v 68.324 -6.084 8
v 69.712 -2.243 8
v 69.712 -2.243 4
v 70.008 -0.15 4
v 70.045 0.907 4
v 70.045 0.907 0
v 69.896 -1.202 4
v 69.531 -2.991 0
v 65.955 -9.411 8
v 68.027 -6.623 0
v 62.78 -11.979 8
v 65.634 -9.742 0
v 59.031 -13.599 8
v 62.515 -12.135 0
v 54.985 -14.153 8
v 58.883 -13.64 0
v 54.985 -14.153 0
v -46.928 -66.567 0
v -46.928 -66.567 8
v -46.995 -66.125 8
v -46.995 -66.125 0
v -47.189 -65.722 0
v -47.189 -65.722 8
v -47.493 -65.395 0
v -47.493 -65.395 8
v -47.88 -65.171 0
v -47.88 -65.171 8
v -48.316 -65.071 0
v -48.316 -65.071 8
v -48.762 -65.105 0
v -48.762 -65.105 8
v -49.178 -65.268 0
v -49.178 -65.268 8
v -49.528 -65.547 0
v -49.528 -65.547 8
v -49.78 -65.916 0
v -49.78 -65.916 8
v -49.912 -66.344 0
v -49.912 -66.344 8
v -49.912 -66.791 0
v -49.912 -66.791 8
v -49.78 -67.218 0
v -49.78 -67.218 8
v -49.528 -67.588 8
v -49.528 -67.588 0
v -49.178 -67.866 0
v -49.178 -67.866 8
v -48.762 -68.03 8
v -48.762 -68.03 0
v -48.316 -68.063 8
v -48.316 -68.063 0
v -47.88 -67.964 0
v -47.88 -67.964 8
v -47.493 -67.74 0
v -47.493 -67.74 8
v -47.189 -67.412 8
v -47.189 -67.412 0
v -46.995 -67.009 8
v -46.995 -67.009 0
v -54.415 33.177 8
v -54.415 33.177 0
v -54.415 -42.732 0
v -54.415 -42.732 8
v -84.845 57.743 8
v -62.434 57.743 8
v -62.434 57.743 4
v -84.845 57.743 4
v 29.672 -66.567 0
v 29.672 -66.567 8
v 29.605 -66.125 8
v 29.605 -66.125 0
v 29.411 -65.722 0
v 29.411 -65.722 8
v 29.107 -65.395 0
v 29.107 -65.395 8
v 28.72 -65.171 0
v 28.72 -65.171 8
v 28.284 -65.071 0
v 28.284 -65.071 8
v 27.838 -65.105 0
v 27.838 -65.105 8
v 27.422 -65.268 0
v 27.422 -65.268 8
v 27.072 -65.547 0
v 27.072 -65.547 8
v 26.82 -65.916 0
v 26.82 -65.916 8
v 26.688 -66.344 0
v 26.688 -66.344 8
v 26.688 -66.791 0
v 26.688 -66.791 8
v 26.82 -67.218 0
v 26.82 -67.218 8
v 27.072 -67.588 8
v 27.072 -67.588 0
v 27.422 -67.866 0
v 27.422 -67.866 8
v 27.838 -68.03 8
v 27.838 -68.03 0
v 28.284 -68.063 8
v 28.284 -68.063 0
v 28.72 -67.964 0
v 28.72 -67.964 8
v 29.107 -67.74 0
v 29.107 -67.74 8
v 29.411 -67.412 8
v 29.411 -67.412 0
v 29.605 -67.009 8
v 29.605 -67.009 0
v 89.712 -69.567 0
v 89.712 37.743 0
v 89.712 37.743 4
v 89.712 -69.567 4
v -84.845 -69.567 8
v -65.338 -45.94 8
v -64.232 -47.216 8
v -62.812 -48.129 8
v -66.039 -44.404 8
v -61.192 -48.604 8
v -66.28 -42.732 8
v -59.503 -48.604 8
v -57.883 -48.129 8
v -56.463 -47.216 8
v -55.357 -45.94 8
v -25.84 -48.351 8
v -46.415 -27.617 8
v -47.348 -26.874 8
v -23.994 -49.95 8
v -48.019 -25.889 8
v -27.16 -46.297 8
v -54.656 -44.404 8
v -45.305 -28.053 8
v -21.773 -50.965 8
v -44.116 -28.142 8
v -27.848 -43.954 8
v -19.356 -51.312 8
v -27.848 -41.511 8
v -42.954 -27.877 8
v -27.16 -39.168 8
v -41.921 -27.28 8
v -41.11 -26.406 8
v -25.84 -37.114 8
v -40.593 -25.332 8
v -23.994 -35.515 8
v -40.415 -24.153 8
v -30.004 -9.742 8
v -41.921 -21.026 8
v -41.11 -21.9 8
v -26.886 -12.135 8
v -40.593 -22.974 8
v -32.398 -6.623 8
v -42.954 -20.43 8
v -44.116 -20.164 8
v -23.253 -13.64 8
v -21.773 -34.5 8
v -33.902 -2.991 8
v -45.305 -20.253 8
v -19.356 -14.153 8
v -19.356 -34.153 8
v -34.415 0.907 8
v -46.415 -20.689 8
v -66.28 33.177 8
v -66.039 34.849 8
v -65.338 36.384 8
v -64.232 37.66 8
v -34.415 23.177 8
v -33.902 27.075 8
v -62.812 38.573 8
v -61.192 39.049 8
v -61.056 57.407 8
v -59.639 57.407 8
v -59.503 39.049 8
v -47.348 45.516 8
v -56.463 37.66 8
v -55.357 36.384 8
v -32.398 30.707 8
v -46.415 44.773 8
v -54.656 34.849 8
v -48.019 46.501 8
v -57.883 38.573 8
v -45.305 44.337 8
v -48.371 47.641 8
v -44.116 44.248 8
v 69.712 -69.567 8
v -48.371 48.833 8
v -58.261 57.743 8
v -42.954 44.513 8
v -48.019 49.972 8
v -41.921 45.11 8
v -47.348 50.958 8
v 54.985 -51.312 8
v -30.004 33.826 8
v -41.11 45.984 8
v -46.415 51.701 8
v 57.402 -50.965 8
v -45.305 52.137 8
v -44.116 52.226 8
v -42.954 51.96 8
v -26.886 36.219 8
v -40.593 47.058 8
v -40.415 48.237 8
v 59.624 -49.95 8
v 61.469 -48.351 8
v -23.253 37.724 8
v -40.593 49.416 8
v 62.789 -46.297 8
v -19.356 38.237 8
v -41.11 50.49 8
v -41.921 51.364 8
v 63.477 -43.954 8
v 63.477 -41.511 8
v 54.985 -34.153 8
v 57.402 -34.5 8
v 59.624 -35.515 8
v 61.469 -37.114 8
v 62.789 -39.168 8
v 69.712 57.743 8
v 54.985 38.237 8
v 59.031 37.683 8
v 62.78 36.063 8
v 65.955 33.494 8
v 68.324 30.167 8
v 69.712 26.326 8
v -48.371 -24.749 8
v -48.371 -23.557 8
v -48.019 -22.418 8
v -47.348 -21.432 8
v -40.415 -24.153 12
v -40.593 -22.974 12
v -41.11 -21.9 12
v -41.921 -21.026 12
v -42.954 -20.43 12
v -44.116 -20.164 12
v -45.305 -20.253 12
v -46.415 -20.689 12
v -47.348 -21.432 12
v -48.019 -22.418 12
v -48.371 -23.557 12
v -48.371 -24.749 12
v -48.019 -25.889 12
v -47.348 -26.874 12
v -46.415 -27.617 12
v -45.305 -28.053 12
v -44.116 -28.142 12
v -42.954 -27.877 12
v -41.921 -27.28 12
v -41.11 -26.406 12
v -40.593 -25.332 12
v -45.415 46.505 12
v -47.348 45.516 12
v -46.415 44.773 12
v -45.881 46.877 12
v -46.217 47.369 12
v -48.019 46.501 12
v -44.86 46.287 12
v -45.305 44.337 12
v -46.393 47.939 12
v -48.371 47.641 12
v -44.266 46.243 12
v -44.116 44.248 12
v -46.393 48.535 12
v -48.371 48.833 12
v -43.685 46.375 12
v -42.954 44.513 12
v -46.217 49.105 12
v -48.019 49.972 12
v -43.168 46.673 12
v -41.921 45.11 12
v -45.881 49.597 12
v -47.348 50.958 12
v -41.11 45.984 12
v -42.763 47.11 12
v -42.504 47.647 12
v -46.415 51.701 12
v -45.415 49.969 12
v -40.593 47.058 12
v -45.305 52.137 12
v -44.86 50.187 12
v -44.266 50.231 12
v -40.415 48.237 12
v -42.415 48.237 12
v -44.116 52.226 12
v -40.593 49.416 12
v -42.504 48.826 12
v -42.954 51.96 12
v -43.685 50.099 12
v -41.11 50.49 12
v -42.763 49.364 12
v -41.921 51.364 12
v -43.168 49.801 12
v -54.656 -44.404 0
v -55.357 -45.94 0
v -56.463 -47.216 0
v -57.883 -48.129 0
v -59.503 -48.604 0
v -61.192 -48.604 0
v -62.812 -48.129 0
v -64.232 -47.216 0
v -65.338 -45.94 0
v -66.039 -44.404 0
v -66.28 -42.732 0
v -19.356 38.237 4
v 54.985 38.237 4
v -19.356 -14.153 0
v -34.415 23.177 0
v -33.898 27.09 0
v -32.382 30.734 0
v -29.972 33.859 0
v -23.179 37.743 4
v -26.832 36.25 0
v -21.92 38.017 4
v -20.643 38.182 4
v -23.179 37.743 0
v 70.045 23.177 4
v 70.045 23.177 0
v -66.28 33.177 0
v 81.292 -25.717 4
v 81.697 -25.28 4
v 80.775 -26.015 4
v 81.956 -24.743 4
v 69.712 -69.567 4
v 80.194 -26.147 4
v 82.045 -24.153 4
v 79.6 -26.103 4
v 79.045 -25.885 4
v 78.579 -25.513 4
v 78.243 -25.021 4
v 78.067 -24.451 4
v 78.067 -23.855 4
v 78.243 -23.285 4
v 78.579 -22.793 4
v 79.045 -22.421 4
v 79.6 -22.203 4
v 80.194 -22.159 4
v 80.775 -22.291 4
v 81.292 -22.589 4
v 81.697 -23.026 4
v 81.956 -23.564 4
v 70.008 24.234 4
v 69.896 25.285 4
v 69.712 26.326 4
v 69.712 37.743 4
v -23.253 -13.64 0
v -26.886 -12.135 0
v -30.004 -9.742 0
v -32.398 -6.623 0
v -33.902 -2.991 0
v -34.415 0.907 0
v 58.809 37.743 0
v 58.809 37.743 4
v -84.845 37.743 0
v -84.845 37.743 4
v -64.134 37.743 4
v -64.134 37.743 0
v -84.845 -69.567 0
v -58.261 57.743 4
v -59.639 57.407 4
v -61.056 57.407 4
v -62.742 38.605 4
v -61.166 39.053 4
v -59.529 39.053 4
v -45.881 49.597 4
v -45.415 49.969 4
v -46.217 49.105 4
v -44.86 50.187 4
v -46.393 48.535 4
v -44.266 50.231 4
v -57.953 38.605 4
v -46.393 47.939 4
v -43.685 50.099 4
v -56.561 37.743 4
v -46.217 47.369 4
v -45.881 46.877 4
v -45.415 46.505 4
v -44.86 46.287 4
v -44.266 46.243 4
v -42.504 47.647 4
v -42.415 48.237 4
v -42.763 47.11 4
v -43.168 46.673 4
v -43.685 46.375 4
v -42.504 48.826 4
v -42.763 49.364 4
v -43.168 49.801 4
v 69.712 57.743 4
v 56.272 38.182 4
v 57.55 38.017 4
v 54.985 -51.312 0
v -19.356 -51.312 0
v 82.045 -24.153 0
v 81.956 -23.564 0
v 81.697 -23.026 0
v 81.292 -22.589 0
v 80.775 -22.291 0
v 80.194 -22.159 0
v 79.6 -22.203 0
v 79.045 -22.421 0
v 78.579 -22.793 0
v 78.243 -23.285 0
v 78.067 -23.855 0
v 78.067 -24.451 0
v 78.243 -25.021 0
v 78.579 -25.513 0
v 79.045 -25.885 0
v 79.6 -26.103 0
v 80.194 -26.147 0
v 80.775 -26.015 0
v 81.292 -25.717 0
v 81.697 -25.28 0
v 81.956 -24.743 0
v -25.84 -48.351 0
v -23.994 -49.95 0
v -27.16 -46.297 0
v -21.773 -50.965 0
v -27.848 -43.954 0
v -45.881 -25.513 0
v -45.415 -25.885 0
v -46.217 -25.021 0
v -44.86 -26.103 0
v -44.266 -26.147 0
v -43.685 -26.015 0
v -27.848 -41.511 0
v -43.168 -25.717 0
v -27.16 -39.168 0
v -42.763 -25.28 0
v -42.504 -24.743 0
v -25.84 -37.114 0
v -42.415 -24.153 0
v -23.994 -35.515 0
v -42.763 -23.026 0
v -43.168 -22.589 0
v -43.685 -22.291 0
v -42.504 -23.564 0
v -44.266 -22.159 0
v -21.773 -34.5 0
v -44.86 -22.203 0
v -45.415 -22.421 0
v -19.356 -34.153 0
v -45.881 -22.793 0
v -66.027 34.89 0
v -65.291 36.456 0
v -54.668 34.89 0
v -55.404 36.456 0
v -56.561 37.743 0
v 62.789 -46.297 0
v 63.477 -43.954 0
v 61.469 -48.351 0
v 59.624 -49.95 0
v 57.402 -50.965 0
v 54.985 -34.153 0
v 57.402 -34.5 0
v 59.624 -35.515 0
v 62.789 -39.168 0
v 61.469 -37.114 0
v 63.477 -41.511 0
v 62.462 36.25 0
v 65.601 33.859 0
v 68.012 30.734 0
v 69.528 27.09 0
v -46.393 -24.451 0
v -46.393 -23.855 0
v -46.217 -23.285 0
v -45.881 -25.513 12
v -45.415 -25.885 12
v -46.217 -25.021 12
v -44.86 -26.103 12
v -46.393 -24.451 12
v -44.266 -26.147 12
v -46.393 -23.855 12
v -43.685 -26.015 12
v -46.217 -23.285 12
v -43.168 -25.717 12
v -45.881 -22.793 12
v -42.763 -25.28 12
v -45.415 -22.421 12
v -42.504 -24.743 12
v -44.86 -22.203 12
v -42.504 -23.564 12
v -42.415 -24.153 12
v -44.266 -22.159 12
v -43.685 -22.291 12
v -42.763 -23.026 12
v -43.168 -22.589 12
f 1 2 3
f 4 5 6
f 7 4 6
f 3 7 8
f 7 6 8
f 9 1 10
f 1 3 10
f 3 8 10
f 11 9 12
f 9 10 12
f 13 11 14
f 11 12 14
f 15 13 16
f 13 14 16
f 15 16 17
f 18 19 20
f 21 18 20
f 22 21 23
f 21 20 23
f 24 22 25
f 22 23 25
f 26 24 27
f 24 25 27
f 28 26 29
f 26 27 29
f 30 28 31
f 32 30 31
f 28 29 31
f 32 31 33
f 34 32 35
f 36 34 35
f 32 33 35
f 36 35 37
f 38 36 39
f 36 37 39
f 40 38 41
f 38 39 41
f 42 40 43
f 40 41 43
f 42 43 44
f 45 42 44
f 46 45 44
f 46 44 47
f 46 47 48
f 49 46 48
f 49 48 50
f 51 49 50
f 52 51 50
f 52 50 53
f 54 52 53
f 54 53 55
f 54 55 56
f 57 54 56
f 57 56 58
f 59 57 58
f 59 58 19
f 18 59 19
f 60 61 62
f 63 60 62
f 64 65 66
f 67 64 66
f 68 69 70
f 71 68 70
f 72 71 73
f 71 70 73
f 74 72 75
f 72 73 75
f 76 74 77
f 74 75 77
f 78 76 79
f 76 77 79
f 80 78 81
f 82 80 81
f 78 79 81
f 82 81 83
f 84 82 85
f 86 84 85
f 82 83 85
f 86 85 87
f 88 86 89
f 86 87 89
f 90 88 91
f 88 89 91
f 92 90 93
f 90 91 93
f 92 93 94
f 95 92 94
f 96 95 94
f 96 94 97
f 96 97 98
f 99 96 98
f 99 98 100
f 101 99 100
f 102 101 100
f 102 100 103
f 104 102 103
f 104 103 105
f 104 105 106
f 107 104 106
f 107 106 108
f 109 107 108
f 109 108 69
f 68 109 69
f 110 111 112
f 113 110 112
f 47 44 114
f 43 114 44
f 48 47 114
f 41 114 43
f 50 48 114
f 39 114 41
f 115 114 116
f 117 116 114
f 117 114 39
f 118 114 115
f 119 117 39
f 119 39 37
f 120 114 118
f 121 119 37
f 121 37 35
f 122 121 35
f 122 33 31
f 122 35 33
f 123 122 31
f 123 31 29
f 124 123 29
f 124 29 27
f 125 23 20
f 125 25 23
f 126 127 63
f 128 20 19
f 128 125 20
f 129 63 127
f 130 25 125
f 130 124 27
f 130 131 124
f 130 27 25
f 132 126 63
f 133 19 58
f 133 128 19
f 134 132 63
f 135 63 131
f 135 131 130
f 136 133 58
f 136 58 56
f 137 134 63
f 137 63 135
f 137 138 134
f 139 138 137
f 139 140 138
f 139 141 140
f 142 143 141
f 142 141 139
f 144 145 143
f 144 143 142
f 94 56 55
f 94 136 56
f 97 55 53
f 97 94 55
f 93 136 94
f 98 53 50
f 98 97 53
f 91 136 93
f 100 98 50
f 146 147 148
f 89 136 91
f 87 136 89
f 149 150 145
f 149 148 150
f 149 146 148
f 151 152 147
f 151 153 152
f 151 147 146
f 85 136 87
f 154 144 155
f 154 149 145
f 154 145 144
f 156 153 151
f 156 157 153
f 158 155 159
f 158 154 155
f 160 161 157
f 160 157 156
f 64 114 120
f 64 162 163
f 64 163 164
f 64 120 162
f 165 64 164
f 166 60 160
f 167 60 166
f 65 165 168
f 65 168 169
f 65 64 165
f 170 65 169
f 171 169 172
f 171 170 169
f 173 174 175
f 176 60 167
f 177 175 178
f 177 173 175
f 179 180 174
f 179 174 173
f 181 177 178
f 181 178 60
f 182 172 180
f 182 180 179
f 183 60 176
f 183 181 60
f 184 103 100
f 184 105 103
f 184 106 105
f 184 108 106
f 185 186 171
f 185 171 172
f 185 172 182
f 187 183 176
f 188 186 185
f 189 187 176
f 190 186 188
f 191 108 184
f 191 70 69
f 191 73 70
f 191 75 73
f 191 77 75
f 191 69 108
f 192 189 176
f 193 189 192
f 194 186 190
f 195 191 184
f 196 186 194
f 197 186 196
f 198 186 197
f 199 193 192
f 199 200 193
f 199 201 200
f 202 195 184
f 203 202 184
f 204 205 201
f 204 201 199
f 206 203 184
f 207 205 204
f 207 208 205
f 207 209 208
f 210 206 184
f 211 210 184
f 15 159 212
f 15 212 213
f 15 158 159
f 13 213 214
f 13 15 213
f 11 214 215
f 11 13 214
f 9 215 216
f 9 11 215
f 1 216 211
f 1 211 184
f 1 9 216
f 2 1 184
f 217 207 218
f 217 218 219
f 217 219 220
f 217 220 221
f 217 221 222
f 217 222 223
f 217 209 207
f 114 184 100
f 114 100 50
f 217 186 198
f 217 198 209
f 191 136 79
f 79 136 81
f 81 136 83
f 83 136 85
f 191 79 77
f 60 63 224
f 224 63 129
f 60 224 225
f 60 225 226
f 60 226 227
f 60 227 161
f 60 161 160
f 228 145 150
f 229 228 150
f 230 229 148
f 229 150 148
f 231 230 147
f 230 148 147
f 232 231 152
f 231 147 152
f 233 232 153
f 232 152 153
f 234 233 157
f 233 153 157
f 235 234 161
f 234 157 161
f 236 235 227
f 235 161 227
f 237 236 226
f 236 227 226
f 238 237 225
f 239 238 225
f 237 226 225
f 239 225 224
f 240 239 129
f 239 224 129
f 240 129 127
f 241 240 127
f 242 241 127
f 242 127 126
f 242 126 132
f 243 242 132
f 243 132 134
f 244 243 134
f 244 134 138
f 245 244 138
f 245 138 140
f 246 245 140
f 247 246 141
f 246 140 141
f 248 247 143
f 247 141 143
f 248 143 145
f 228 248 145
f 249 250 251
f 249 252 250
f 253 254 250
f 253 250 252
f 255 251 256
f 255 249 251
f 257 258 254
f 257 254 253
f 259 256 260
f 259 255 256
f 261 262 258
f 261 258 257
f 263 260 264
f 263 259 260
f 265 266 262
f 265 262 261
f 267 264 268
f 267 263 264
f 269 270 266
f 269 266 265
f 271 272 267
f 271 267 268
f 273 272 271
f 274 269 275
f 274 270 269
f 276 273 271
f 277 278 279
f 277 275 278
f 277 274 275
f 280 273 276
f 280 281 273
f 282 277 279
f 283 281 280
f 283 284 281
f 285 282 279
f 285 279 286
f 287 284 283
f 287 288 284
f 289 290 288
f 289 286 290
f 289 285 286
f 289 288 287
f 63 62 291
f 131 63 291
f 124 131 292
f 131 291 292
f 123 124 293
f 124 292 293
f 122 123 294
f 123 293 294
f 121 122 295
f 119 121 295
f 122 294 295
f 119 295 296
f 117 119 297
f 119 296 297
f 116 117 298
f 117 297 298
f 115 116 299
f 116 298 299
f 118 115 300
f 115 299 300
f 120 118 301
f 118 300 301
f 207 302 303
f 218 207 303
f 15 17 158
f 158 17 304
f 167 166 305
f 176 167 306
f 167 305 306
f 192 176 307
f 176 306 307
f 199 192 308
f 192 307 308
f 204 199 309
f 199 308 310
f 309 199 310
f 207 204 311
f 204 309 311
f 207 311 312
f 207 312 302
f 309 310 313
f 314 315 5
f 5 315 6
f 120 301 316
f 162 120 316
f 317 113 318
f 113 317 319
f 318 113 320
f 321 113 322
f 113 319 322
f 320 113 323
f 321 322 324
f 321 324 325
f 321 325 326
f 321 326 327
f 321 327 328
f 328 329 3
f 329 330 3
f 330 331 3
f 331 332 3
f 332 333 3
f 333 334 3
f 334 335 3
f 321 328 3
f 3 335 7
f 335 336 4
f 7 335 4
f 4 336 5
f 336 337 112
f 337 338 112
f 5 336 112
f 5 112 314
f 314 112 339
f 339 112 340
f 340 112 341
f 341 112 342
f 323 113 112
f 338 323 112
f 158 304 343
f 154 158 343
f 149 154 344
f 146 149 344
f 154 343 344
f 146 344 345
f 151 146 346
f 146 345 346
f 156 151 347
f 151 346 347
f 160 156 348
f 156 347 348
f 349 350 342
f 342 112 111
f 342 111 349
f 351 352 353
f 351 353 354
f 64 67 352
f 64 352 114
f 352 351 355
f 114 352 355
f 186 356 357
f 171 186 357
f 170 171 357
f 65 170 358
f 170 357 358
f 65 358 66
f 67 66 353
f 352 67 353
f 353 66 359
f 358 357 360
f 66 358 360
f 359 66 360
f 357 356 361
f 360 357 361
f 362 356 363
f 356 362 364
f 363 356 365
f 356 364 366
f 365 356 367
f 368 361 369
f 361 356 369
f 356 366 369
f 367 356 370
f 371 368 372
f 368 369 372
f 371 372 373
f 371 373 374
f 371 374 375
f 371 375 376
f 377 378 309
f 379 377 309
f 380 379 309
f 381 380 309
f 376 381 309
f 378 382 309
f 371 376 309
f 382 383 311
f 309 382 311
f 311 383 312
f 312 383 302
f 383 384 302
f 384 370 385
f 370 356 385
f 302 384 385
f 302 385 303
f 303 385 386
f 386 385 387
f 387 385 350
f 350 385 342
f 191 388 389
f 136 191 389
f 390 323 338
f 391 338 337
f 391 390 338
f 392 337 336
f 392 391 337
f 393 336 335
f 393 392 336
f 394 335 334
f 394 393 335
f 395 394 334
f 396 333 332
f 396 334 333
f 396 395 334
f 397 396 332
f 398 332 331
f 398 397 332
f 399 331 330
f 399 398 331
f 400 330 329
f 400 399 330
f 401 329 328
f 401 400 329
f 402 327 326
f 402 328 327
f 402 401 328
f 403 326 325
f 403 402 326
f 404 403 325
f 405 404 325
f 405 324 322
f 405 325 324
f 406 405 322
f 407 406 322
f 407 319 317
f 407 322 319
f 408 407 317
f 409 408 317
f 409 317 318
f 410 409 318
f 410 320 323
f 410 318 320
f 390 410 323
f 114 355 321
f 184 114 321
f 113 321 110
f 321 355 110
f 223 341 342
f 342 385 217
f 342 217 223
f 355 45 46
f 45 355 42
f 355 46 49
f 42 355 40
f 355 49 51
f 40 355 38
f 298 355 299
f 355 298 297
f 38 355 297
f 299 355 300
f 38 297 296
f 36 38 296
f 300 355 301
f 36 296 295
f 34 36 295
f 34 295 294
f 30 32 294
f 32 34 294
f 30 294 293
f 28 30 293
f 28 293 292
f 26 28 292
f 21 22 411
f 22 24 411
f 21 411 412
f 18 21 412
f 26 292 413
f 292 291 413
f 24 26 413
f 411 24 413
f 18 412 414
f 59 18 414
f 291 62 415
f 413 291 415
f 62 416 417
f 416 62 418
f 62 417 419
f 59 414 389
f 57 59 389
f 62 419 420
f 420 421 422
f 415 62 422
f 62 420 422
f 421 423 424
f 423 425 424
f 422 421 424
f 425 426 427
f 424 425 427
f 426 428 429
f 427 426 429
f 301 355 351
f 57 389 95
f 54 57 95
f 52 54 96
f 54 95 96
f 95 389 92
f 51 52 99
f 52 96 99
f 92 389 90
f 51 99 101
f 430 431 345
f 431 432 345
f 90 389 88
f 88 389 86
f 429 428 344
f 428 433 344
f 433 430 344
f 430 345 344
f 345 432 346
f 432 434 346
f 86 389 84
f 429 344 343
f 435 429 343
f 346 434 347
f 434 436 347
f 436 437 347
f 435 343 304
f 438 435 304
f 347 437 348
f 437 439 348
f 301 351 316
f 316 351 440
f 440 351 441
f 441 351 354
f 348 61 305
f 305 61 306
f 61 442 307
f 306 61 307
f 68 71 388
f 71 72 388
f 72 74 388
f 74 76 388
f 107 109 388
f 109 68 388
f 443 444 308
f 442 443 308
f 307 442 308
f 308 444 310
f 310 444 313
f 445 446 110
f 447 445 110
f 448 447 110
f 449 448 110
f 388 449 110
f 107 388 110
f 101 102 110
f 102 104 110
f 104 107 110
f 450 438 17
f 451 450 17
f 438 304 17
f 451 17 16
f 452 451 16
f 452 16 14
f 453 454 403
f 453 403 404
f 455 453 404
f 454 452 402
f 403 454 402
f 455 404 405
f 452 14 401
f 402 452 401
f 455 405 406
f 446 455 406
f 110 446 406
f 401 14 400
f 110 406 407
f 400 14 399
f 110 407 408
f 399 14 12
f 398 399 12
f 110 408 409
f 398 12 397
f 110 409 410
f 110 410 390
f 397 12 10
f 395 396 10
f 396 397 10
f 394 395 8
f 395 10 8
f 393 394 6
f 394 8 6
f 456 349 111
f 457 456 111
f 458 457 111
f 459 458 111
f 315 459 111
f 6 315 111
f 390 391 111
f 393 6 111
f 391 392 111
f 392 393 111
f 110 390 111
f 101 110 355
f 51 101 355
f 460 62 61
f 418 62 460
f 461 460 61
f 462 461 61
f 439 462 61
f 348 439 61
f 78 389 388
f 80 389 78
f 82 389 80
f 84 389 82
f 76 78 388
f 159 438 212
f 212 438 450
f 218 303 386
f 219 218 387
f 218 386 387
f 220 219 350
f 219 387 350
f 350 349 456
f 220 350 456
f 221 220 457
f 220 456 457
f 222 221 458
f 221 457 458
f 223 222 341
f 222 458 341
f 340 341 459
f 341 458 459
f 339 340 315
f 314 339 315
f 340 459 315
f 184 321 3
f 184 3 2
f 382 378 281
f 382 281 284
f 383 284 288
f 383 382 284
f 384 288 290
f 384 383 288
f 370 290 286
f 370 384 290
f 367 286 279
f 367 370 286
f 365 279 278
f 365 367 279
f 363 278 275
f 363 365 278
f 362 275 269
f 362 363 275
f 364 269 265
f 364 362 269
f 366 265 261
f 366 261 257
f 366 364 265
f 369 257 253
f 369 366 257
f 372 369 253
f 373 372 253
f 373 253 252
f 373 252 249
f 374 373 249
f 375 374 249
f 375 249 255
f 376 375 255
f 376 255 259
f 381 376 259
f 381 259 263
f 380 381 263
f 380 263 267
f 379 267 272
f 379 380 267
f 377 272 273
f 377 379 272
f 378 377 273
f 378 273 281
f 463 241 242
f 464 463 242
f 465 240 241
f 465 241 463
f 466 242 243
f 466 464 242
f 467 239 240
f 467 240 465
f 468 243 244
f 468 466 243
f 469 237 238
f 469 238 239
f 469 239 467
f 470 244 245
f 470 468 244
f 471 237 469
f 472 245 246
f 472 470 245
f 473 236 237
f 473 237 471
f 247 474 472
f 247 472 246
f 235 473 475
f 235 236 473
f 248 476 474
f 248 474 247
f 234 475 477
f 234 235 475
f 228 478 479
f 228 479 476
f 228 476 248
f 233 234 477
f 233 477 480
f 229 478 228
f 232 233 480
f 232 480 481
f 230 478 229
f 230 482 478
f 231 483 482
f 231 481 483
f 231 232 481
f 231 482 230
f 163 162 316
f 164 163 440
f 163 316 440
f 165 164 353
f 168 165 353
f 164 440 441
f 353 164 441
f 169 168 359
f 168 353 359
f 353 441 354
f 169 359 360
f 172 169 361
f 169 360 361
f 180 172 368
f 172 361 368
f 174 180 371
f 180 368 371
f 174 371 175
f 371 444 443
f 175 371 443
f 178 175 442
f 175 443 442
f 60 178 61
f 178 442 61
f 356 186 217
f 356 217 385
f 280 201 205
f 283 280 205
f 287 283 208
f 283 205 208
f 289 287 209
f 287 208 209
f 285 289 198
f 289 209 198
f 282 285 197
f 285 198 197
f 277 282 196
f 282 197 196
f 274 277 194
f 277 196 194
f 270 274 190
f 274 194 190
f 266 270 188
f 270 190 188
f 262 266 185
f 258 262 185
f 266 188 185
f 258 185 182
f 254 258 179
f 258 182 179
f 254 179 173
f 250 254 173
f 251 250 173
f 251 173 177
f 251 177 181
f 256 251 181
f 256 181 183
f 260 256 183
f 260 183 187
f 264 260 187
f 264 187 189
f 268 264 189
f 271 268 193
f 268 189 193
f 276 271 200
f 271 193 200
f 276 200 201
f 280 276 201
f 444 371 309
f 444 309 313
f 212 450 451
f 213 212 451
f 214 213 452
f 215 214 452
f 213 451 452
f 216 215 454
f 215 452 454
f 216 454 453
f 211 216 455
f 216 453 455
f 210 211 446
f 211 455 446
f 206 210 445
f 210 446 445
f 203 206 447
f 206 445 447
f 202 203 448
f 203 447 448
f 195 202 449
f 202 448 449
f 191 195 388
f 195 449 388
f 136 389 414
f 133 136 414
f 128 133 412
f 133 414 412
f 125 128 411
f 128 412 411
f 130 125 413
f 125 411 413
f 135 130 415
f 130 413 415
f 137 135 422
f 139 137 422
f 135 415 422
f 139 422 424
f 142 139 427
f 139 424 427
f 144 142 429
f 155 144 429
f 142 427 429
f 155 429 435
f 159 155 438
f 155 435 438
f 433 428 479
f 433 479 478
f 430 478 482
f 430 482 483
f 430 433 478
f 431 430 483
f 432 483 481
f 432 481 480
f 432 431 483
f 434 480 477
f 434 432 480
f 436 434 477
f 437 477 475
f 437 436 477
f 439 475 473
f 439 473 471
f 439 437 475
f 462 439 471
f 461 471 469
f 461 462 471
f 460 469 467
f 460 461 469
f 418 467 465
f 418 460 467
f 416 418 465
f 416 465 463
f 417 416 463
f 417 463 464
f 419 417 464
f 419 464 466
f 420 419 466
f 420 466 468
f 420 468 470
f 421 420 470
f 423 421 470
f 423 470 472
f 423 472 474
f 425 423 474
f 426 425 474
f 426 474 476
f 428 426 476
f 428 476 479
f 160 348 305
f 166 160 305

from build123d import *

# Parameters (mm, degrees)
F0_R      = 2
F1_DEPTH  = 8
F3_DEPTH  = 185
F5_DEPTH  = 5
F6_R      = 4
F6_R_2    = 2
F7_DEPTH  = 4
F9_DEPTH  = 340
F11_DEPTH = 320
F12_DEPTH = 190
F13_R     = 1.5
F14_DEPTH = 25


with BuildPart() as f1:
    # F0 (on Top) → F1 (new body)
    with BuildSketch(Plane.XY):
        Polygon((248.954638797, 211.431907829), (-84.8453715444, 211.431907829), (-84.8453715444, -69.5673050332), (248.954638797, -69.5673050332), (248.954638797, -32.408092171), align=None)
        with Locations((-44.415361203, -24.153092171)):
            Circle(F0_R, mode=Mode.SUBTRACT)
        with BuildLine():
            Line((-54.4153634839, 33.1772758796), (-54.4153634839, -42.7324894255))
            ThreePointArc((-54.4153634839, -42.7324894255), (-60.3474954333, -48.664621375), (-66.2796273828, -42.7324894255))
            Line((-66.2796273828, -42.7324894255), (-66.2796273828, 33.1772758796))
            ThreePointArc((-66.2796273828, 33.1772758796), (-60.3474954333, 39.109407829), (-54.4153634839, 33.1772758796))
        make_face(mode=Mode.SUBTRACT)
        with BuildLine():
            Line((-19.3557292535, -34.1526738179), (54.9850068476, -34.1526738179))
            ThreePointArc((54.9850068476, -34.1526738179), (63.5648240612, -42.7324878197), (54.9850100594, -51.3123050332))
            Line((54.9850100594, -51.3123050332), (-19.3557260418, -51.3123050332))
            ThreePointArc((-19.3557260418, -51.3123050332), (-27.9355464671, -42.7324910314), (-19.3557292535, -34.1526738179))
        make_face(mode=Mode.SUBTRACT)
        with Locations((80.044638797, -24.153092171)):
            Circle(F0_R, mode=Mode.SUBTRACT)
        with Locations((-44.415361203, 48.236907829)):
            Circle(F0_R, mode=Mode.SUBTRACT)
        with BuildLine():
            ThreePointArc((-34.415361203, 23.1772758796), (-30.0044971271, 33.8260437532), (-19.3557292535, 38.236907829))
            Line((-19.3557292535, 38.236907829), (54.9850068476, 38.236907829))
            ThreePointArc((54.9850068476, 38.236907829), (65.6337747212, 33.8260437532), (70.044638797, 23.1772758796))
            Line((70.044638797, 23.1772758796), (70.044638797, 0.9065397785))
            ThreePointArc((70.044638797, 0.9065397785), (65.6337747212, -9.7422280951), (54.9850068476, -14.153092171))
            Line((54.9850068476, -14.153092171), (-19.3557292535, -14.153092171))
            ThreePointArc((-19.3557292535, -14.153092171), (-30.0044971271, -9.7422280951), (-34.415361203, 0.9065397785))
            Line((-34.415361203, 0.9065397785), (-34.415361203, 23.1772758796))
        make_face(mode=Mode.SUBTRACT)
        with Locations((80.044638797, 48.236907829)):
            Circle(F0_R, mode=Mode.SUBTRACT)
        with BuildLine():
            ThreePointArc((212.4650068476, -34.1526738179), (221.0448240612, -42.7324878197), (212.4650100594, -51.3123050332))
            Line((212.4650100594, -51.3123050332), (105.1042739582, -51.3123050332))
            ThreePointArc((105.1042739582, -51.3123050332), (96.5244567447, -42.7324910314), (105.1042707465, -34.1526738179))
            Line((105.1042707465, -34.1526738179), (212.4650068476, -34.1526738179))
        make_face(mode=Mode.SUBTRACT)
        with Locations((237.524638797, -24.153092171)):
            Circle(F0_R, mode=Mode.SUBTRACT)
        with BuildLine():
            Line((90.044638797, 0.9065397785), (90.044638797, 23.1772758796))
            ThreePointArc((90.044638797, 23.1772758796), (94.4555028729, 33.8260437532), (105.1042707465, 38.236907829))
            Line((105.1042707465, 38.236907829), (212.4650068476, 38.236907829))
            ThreePointArc((212.4650068476, 38.236907829), (223.1137747212, 33.8260437532), (227.524638797, 23.1772758796))
            Line((227.524638797, 23.1772758796), (227.524638797, 0.9065397785))
            ThreePointArc((227.524638797, 0.9065397785), (223.1137747212, -9.7422280951), (212.4650068476, -14.153092171))
            Line((212.4650068476, -14.153092171), (105.1042707465, -14.153092171))
            ThreePointArc((105.1042707465, -14.153092171), (94.4555028729, -9.7422280951), (90.044638797, 0.9065397785))
        make_face(mode=Mode.SUBTRACT)
        with Locations((237.524638797, 48.236907829)):
            Circle(F0_R, mode=Mode.SUBTRACT)
        with BuildLine():
            Line((-54.4153634839, 180.316907829), (-54.4153634839, 63.2965397785))
            ThreePointArc((-54.4153634839, 63.2965397785), (-60.3474954333, 57.364407829), (-66.2796273828, 63.2965397785))
            Line((-66.2796273828, 63.2965397785), (-66.2796273828, 180.316907829))
            ThreePointArc((-66.2796273828, 180.316907829), (-60.3474954333, 186.2490397785), (-54.4153634839, 180.316907829))
        make_face(mode=Mode.SUBTRACT)
        with BuildLine():
            Line((-34.415361203, 73.2965397785), (-34.415361203, 178.1172758796))
            ThreePointArc((-34.415361203, 178.1172758796), (-30.0044971271, 188.7660437532), (-19.3557292535, 193.176907829))
            Line((-19.3557292535, 193.176907829), (54.9850068476, 193.176907829))
            ThreePointArc((54.9850068476, 193.176907829), (65.6337747212, 188.7660437532), (70.044638797, 178.1172758796))
            Line((70.044638797, 178.1172758796), (70.044638797, 73.2965397785))
            ThreePointArc((70.044638797, 73.2965397785), (65.6337747212, 62.6477719049), (54.9850068476, 58.236907829))
            Line((54.9850068476, 58.236907829), (-19.3557292535, 58.236907829))
            ThreePointArc((-19.3557292535, 58.236907829), (-30.0044971271, 62.6477719049), (-34.415361203, 73.2965397785))
        make_face(mode=Mode.SUBTRACT)
        with Locations((-44.415361203, 203.176907829)):
            Circle(F0_R, mode=Mode.SUBTRACT)
        with Locations((80.044638797, 203.176907829)):
            Circle(F0_R, mode=Mode.SUBTRACT)
        with BuildLine():
            ThreePointArc((227.524638797, 73.2965397785), (223.1137747212, 62.6477719049), (212.4650068476, 58.236907829))
            Line((212.4650068476, 58.236907829), (105.1042707465, 58.236907829))
            ThreePointArc((105.1042707465, 58.236907829), (94.4555028729, 62.6477719049), (90.044638797, 73.2965397785))
            Line((90.044638797, 73.2965397785), (90.044638797, 178.1172758796))
            ThreePointArc((90.044638797, 178.1172758796), (94.4555028729, 188.7660437532), (105.1042707465, 193.176907829))
            Line((105.1042707465, 193.176907829), (212.4650068476, 193.176907829))
            Line((212.4650068476, 193.176907829), (212.4650068476, 170.316907829))
            ThreePointArc((212.4650068476, 170.316907829), (223.1137747212, 165.9060437532), (227.524638797, 155.2572758796))
            Line((227.524638797, 155.2572758796), (227.524638797, 73.2965397785))
        make_face(mode=Mode.SUBTRACT)
        with Locations((237.524638797, 180.316907829)):
            Circle(F0_R, mode=Mode.SUBTRACT)
    extrude(amount=F1_DEPTH)

    # F2 (on face) → F3 (join)
    with BuildSketch(Plane.XY.offset(8)):
        Polygon((15.1546284556, 211.431907829), (-84.8453715444, 211.431907829), (-84.8453715444, 71.431907829), (-81.8453715444, 71.431907829), (-81.8453715444, 208.431907829), (15.1546284556, 208.431907829), align=None)
    extrude(amount=F3_DEPTH)

    # F4 (on face) → F5 (cut)
    with BuildSketch(Plane(origin=(-84.8453715444, 0, 0), x_dir=(0, -1, 0), z_dir=(-1, 0, 0))):
        Polygon((-169.016168882, 40), (-201.431907829, 143.5533241114), (-201.431907829, 40), align=None)
        Polygon((-71.431907829, 193), (-206.431907829, 193), (-158.5376649213, 40), (-71.431907829, 40), align=None)
    extrude(amount=-F5_DEPTH, mode=Mode.SUBTRACT)

    # F6 (on face) → F7 (join)
    with BuildSketch(Plane.XY.offset(8)):
        with Locations((-44.415361203, 48.236907829)):
            Circle(F6_R)
        with Locations((-44.415361203, 48.236907829)):
            Circle(F6_R_2, mode=Mode.SUBTRACT)
        with Locations((-44.415361203, -24.153092171)):
            Circle(F6_R)
        with Locations((-44.415361203, -24.153092171)):
            Circle(F6_R_2, mode=Mode.SUBTRACT)
    extrude(amount=F7_DEPTH)

    # F8 (on face) → F9 (cut)
    with BuildSketch(Plane.YZ.offset(248.954638797)):
        Polygon((57.7434247732, 4), (37.7434247732, 4), (37.7434247732, 0), (211.431907829, 0), (211.431907829, 8), (57.7434247732, 8), align=None)
    extrude(amount=-F9_DEPTH, mode=Mode.SUBTRACT)

    # F10 (on face) → F11 (cut)
    with BuildSketch(Plane(origin=(0, 211.431907829, 0), x_dir=(-1, 0, 0), z_dir=(0, 1, 0))):
        Polygon((-89.7116868198, 4), (-69.7116868198, 4), (-69.7116868198, 8), (-270.7538604736, 8), (-270.7538604736, -15.3804672882), (-89.7116868198, 0), align=None)
    extrude(amount=-F11_DEPTH, mode=Mode.SUBTRACT)

    # F12 (cut): a face of the model
    f12_faces = [f1.faces().sort_by_distance(p)[0] for p in [
        (13.4341634022, 209.931907829, 8),
    ]]
    extrude(f12_faces, amount=-F12_DEPTH, mode=Mode.SUBTRACT)

    # F13 (on face) → F14 (cut)
    with BuildSketch(Plane.XY.offset(8)):
        with Locations((28.1716429389, -66.5673050332)):
            Circle(F13_R)
        with Locations((-48.4283570611, -66.5673050332)):
            Circle(F13_R)
    extrude(amount=-F14_DEPTH, mode=Mode.SUBTRACT)


solid = f1.part
